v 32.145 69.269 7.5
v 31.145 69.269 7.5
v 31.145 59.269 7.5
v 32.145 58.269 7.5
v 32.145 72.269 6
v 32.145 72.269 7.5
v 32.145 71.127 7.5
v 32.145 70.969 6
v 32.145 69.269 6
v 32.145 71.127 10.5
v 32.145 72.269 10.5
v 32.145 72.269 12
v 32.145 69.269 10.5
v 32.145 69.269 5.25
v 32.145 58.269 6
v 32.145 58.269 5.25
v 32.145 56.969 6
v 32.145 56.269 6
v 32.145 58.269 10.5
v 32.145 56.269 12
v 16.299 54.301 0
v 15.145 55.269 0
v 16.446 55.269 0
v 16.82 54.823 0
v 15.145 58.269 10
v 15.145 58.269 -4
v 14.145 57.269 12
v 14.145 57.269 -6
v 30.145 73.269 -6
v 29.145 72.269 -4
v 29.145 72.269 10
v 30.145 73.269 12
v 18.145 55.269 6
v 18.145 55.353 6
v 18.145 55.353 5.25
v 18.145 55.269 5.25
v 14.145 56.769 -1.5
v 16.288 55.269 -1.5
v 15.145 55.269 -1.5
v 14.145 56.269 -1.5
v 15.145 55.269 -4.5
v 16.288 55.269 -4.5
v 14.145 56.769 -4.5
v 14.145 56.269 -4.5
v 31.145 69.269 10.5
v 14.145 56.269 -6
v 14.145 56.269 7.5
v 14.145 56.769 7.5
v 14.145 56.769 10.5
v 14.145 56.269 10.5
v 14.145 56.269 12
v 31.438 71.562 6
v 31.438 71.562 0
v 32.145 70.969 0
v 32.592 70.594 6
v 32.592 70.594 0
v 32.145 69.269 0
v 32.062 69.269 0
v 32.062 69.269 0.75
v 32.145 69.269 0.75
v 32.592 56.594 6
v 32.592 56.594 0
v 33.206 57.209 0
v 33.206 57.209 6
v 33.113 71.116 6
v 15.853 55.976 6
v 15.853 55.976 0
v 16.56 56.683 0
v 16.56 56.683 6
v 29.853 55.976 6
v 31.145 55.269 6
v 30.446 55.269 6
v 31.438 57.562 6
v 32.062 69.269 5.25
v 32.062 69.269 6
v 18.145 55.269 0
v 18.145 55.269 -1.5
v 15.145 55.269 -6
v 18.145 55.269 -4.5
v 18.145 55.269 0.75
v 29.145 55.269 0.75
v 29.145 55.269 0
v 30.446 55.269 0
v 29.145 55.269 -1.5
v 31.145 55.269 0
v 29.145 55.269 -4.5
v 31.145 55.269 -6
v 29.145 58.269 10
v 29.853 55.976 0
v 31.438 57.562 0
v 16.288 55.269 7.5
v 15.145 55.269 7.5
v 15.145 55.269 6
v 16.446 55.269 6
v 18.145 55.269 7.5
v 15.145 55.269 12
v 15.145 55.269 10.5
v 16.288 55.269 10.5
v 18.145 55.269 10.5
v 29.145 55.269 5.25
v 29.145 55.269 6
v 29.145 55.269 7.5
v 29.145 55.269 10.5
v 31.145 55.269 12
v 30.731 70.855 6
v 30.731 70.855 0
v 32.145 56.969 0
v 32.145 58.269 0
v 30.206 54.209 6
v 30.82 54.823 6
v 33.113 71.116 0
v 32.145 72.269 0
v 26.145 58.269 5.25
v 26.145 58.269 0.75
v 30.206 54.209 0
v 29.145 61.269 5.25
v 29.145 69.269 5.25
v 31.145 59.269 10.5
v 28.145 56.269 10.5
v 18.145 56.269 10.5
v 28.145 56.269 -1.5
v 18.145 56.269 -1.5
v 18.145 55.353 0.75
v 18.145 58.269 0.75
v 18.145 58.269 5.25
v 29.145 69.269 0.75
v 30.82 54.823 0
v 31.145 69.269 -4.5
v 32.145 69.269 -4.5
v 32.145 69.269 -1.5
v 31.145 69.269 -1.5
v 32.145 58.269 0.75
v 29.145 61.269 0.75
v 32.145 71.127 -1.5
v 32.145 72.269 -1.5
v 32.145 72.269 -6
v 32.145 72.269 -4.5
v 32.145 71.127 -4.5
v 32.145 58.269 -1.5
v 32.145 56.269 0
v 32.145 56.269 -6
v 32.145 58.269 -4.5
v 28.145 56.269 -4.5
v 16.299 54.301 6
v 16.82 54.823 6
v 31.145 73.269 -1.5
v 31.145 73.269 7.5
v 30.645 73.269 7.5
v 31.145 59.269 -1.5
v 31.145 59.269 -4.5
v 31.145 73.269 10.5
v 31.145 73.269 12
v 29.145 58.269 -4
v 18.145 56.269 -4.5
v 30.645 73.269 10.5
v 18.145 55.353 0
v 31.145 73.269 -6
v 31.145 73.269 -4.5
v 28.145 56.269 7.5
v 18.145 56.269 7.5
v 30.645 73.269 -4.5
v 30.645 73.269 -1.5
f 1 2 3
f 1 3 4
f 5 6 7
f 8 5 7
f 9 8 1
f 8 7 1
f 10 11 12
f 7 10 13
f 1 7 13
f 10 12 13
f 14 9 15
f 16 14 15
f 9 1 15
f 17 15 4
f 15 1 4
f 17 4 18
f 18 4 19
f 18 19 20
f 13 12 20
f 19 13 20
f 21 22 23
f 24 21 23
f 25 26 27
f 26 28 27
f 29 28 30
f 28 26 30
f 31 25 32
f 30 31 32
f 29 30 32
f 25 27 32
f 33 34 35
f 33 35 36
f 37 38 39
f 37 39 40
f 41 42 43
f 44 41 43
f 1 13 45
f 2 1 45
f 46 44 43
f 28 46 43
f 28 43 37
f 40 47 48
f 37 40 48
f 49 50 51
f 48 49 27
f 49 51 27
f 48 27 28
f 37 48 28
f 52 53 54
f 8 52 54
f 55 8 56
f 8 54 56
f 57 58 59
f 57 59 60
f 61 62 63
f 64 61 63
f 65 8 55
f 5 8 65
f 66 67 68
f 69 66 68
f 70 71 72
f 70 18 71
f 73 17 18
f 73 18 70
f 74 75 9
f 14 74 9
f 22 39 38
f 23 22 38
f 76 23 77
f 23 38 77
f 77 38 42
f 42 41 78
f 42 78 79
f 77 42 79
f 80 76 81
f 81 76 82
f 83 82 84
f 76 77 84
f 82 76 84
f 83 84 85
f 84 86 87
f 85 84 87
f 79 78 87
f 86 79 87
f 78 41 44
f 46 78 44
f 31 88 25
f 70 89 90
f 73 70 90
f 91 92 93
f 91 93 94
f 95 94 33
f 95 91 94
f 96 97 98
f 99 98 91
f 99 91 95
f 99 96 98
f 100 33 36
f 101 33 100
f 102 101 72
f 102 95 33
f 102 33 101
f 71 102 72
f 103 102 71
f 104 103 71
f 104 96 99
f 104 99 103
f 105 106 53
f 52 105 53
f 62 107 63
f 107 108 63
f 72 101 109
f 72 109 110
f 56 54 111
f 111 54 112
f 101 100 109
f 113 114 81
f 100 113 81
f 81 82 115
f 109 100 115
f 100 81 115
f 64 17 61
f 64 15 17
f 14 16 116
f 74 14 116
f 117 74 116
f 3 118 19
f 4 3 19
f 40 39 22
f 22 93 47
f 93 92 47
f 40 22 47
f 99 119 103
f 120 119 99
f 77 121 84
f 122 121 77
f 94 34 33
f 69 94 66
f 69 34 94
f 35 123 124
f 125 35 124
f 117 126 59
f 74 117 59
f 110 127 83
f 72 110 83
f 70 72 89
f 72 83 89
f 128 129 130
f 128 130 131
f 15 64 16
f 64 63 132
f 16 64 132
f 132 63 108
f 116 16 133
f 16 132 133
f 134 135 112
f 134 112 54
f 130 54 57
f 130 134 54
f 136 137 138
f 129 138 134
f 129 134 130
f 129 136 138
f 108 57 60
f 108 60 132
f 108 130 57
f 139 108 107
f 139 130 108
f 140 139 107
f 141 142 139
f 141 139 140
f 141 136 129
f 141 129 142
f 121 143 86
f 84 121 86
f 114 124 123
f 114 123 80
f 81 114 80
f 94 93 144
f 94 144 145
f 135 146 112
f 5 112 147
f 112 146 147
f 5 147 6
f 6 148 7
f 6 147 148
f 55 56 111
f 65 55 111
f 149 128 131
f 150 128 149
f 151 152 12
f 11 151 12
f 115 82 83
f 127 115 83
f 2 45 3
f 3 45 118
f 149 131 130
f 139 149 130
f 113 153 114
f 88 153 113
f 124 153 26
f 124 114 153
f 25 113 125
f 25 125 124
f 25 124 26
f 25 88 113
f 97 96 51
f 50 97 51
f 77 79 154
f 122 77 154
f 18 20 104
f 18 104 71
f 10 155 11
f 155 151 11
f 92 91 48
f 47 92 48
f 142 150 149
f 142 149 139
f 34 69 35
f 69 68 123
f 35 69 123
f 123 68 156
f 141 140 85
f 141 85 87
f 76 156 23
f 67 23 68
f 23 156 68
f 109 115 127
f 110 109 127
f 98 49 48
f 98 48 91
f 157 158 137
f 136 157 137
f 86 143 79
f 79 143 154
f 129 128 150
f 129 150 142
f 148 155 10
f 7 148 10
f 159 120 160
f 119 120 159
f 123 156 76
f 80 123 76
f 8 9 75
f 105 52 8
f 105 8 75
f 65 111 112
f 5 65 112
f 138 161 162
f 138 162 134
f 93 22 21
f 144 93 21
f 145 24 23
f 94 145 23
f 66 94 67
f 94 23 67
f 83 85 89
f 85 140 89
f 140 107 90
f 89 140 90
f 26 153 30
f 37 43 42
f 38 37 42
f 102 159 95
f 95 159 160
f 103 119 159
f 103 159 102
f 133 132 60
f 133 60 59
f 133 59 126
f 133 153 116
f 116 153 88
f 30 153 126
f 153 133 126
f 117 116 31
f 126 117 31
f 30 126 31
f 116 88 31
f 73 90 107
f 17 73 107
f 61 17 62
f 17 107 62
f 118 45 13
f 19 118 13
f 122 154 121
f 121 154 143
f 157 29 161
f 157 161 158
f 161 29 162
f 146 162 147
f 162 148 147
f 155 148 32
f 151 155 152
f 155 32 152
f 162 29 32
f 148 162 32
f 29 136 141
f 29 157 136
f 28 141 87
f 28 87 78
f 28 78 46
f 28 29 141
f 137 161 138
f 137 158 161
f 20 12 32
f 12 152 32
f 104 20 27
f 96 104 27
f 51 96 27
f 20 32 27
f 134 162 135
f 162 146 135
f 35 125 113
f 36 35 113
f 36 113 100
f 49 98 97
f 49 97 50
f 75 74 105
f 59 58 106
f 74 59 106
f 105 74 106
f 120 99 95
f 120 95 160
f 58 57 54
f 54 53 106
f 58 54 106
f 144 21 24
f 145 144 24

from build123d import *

# Parameters (mm, degrees)
EXTRUDE_1_DEPTH     = 6
EXTRUDE_1_2_DEPTH   = 6
EXTRUDE_1_3_DEPTH   = 6
EXTRUDE_2_DEPTH     = 4
EXTRUDE_3_DEPTH     = 2
EXTRUDE_4_DEPTH     = 0.75
EXTRUDE_5_DEPTH     = 0.75
CUT_EXTRUDE_2_DEPTH = 3
CUT_EXTRUDE_3_DEPTH = 3
CUT_EXTRUDE_4_DEPTH = 3
CUT_EXTRUDE_5_DEPTH = 3
CHAMFER_1_SIZE      = 1


with BuildPart() as part:
    # 草图1 → 拉伸1 (new body)
    with BuildSketch(Plane.XY):
        Polygon((32.591759834, 56.594303521), (33.206070874, 57.208614562), (29.145410702, 61.269274733), (29.145410702, 58.269274733), (26.145410702, 58.269274733), (30.206070874, 54.208614562), (30.820381914, 54.822925602), (29.852517484, 55.976381515), (31.438303921, 57.562167952), align=None)
    extrude(amount=EXTRUDE_1_DEPTH)



with BuildPart() as body_2:
    # 草图1 → Extrude 1 2 (new body)
    with BuildSketch(Plane.XY):
        Polygon((18.145410702, 55.352855481), (18.145410702, 58.269274733), (15.145410702, 58.269274733), (14.145410702, 57.269274733), (14.145410702, 56.269274733), (15.145410702, 55.269274733), (16.298866615, 54.301410302), (16.820381914, 54.822925602), (15.852517484, 55.976381515), (16.559624265, 56.683488296), align=None)
    extrude(amount=EXTRUDE_1_2_DEPTH)


with BuildPart() as body_3:
    # 草图1 → Extrude 1 3 (new body)
    with BuildSketch(Plane.XY):
        Polygon((31.438303921, 71.562167952), (32.591759834, 70.594303521), (33.113275133, 71.115818821), (32.145410702, 72.269274733), (31.145410702, 73.269274733), (30.145410702, 73.269274733), (29.145410702, 72.269274733), (29.145410702, 69.269274733), (32.061829955, 69.269274733), (30.73119714, 70.855061171), align=None)
    extrude(amount=EXTRUDE_1_3_DEPTH)


with BuildPart() as part_1:
    add(part.part)

    add(body_2.part)  # 拉伸2 merges body 2

    add(body_3.part)  # 拉伸2 merges body 3
    # 草图2 → 拉伸2 (add)
    with BuildSketch(Plane.XY.offset(6)):
        Polygon((30.145410702, 73.269274733), (31.145410702, 73.269274733), (32.145410702, 72.269274733), (32.145410702, 55.269274733), (15.145410702, 55.269274733), (14.145410702, 56.269274733), (14.145410702, 57.269274733), (15.145410702, 58.269274733), (29.145410702, 58.269274733), (29.145410702, 72.269274733), align=None)
    extrude_2 = extrude(amount=EXTRUDE_2_DEPTH)

    # 镜向1: 拉伸2 across plane
    add(extrude_2.mirror(Plane(origin=(0, 0, 3), x_dir=(1, 0, 0), z_dir=(0, 0, -1))))

    # 草图3 → 拉伸3 (add)
    with BuildSketch(Plane.XY.offset(10)):
        Polygon((30.145410702, 73.269274733), (31.145410702, 73.269274733), (32.145410702, 72.269274733), (32.145410702, 55.269274733), (15.145410702, 55.269274733), (14.145410702, 56.269274733), (14.145410702, 57.269274733), align=None)
    extrude_3 = extrude(amount=EXTRUDE_3_DEPTH)

    # 镜向2: 拉伸3 across plane
    add(extrude_3.mirror(Plane(origin=(0, 0, 3), x_dir=(1, 0, 0), z_dir=(0, 0, -1))))

    # 草图4 → 拉伸4 (add)
    with BuildSketch(Plane.XY):
        Polygon((29.145410702, 69.269274733), (32.145410702, 69.269274733), (32.145410702, 58.269274733), (29.145410702, 61.269274733), align=None)
    extrude_4 = extrude(amount=EXTRUDE_4_DEPTH)

    # 镜向3: 拉伸4 across plane
    add(extrude_4.mirror(Plane(origin=(0, 0, 3), x_dir=(1, 0, 0), z_dir=(0, 0, -1))))

    # 草图5 → 拉伸5 (add)
    with BuildSketch(Plane.XY):
        Polygon((26.145410702, 58.269274733), (18.145410702, 58.269274733), (18.145410702, 55.269274733), (29.145410702, 55.269274733), align=None)
    extrude_5 = extrude(amount=EXTRUDE_5_DEPTH)

    # 镜向4: 拉伸5 across plane
    add(extrude_5.mirror(Plane(origin=(0, 0, 3), x_dir=(1, 0, 0), z_dir=(0, 0, -1))))

    # 草图7 → 切除-拉伸2 (cut)
    with BuildSketch(Plane(origin=(0, 0, -4.5), x_dir=(-1, 0, 0), z_dir=(0, 0, -1))):
        Polygon((-32.145410702, 69.269274733), (-31.145410702, 69.269274733), (-31.145410702, 59.269274733), (-32.145410702, 58.269274733), align=None)
    cut_extrude_2 = extrude(amount=-CUT_EXTRUDE_2_DEPTH, mode=Mode.SUBTRACT)

    # 草图8 → 切除-拉伸3 (cut)
    with BuildSketch(Plane(origin=(0, 0, -4.5), x_dir=(-1, 0, 0), z_dir=(0, 0, -1))):
        Polygon((-18.145410702, 55.269274733), (-18.145410702, 56.269274733), (-28.145410702, 56.269274733), (-29.145410702, 55.269274733), align=None)
    cut_extrude_3 = extrude(amount=-CUT_EXTRUDE_3_DEPTH, mode=Mode.SUBTRACT)

    # 镜向5: 切除-拉伸2, 切除-拉伸3 across plane
    add(cut_extrude_2.mirror(Plane(origin=(0, 0, 3), x_dir=(1, 0, 0), z_dir=(0, 0, -1))), mode=Mode.SUBTRACT)
    add(cut_extrude_3.mirror(Plane(origin=(0, 0, 3), x_dir=(1, 0, 0), z_dir=(0, 0, -1))), mode=Mode.SUBTRACT)

    # 草图9 → 切除-拉伸4 (cut)
    with BuildSketch(Plane(origin=(0, 0, -4.5), x_dir=(-1, 0, 0), z_dir=(0, 0, -1))):
        Polygon((-30.645410702, 73.269274733), (-32.145410702, 71.127052723), (-32.145410702, 72.269274733), (-31.145410702, 73.269274733), align=None)
    cut_extrude_4 = extrude(amount=-CUT_EXTRUDE_4_DEPTH, mode=Mode.SUBTRACT)

    # 草图10 → 切除-拉伸5 (cut)
    with BuildSketch(Plane(origin=(0, 0, -4.5), x_dir=(-1, 0, 0), z_dir=(0, 0, -1))):
        Polygon((-14.145410702, 56.769274733), (-16.287632713, 55.269274733), (-15.145410702, 55.269274733), (-14.145410702, 56.269274733), align=None)
    cut_extrude_5 = extrude(amount=-CUT_EXTRUDE_5_DEPTH, mode=Mode.SUBTRACT)

    # 镜向6: 切除-拉伸4, 切除-拉伸5 across plane
    add(cut_extrude_4.mirror(Plane(origin=(0, 0, 3), x_dir=(1, 0, 0), z_dir=(0, 0, -1))), mode=Mode.SUBTRACT)
    add(cut_extrude_5.mirror(Plane(origin=(0, 0, 3), x_dir=(1, 0, 0), z_dir=(0, 0, -1))), mode=Mode.SUBTRACT)

    # 倒角1
    chamfer_1_edges = [part_1.edges().sort_by_distance(p)[0] for p in [
        (32.145410702, 55.269274733, -3),
        (32.145410702, 55.269274733, 9),
    ]]
    chamfer(chamfer_1_edges, length=CHAMFER_1_SIZE)


solid = part_1.part
